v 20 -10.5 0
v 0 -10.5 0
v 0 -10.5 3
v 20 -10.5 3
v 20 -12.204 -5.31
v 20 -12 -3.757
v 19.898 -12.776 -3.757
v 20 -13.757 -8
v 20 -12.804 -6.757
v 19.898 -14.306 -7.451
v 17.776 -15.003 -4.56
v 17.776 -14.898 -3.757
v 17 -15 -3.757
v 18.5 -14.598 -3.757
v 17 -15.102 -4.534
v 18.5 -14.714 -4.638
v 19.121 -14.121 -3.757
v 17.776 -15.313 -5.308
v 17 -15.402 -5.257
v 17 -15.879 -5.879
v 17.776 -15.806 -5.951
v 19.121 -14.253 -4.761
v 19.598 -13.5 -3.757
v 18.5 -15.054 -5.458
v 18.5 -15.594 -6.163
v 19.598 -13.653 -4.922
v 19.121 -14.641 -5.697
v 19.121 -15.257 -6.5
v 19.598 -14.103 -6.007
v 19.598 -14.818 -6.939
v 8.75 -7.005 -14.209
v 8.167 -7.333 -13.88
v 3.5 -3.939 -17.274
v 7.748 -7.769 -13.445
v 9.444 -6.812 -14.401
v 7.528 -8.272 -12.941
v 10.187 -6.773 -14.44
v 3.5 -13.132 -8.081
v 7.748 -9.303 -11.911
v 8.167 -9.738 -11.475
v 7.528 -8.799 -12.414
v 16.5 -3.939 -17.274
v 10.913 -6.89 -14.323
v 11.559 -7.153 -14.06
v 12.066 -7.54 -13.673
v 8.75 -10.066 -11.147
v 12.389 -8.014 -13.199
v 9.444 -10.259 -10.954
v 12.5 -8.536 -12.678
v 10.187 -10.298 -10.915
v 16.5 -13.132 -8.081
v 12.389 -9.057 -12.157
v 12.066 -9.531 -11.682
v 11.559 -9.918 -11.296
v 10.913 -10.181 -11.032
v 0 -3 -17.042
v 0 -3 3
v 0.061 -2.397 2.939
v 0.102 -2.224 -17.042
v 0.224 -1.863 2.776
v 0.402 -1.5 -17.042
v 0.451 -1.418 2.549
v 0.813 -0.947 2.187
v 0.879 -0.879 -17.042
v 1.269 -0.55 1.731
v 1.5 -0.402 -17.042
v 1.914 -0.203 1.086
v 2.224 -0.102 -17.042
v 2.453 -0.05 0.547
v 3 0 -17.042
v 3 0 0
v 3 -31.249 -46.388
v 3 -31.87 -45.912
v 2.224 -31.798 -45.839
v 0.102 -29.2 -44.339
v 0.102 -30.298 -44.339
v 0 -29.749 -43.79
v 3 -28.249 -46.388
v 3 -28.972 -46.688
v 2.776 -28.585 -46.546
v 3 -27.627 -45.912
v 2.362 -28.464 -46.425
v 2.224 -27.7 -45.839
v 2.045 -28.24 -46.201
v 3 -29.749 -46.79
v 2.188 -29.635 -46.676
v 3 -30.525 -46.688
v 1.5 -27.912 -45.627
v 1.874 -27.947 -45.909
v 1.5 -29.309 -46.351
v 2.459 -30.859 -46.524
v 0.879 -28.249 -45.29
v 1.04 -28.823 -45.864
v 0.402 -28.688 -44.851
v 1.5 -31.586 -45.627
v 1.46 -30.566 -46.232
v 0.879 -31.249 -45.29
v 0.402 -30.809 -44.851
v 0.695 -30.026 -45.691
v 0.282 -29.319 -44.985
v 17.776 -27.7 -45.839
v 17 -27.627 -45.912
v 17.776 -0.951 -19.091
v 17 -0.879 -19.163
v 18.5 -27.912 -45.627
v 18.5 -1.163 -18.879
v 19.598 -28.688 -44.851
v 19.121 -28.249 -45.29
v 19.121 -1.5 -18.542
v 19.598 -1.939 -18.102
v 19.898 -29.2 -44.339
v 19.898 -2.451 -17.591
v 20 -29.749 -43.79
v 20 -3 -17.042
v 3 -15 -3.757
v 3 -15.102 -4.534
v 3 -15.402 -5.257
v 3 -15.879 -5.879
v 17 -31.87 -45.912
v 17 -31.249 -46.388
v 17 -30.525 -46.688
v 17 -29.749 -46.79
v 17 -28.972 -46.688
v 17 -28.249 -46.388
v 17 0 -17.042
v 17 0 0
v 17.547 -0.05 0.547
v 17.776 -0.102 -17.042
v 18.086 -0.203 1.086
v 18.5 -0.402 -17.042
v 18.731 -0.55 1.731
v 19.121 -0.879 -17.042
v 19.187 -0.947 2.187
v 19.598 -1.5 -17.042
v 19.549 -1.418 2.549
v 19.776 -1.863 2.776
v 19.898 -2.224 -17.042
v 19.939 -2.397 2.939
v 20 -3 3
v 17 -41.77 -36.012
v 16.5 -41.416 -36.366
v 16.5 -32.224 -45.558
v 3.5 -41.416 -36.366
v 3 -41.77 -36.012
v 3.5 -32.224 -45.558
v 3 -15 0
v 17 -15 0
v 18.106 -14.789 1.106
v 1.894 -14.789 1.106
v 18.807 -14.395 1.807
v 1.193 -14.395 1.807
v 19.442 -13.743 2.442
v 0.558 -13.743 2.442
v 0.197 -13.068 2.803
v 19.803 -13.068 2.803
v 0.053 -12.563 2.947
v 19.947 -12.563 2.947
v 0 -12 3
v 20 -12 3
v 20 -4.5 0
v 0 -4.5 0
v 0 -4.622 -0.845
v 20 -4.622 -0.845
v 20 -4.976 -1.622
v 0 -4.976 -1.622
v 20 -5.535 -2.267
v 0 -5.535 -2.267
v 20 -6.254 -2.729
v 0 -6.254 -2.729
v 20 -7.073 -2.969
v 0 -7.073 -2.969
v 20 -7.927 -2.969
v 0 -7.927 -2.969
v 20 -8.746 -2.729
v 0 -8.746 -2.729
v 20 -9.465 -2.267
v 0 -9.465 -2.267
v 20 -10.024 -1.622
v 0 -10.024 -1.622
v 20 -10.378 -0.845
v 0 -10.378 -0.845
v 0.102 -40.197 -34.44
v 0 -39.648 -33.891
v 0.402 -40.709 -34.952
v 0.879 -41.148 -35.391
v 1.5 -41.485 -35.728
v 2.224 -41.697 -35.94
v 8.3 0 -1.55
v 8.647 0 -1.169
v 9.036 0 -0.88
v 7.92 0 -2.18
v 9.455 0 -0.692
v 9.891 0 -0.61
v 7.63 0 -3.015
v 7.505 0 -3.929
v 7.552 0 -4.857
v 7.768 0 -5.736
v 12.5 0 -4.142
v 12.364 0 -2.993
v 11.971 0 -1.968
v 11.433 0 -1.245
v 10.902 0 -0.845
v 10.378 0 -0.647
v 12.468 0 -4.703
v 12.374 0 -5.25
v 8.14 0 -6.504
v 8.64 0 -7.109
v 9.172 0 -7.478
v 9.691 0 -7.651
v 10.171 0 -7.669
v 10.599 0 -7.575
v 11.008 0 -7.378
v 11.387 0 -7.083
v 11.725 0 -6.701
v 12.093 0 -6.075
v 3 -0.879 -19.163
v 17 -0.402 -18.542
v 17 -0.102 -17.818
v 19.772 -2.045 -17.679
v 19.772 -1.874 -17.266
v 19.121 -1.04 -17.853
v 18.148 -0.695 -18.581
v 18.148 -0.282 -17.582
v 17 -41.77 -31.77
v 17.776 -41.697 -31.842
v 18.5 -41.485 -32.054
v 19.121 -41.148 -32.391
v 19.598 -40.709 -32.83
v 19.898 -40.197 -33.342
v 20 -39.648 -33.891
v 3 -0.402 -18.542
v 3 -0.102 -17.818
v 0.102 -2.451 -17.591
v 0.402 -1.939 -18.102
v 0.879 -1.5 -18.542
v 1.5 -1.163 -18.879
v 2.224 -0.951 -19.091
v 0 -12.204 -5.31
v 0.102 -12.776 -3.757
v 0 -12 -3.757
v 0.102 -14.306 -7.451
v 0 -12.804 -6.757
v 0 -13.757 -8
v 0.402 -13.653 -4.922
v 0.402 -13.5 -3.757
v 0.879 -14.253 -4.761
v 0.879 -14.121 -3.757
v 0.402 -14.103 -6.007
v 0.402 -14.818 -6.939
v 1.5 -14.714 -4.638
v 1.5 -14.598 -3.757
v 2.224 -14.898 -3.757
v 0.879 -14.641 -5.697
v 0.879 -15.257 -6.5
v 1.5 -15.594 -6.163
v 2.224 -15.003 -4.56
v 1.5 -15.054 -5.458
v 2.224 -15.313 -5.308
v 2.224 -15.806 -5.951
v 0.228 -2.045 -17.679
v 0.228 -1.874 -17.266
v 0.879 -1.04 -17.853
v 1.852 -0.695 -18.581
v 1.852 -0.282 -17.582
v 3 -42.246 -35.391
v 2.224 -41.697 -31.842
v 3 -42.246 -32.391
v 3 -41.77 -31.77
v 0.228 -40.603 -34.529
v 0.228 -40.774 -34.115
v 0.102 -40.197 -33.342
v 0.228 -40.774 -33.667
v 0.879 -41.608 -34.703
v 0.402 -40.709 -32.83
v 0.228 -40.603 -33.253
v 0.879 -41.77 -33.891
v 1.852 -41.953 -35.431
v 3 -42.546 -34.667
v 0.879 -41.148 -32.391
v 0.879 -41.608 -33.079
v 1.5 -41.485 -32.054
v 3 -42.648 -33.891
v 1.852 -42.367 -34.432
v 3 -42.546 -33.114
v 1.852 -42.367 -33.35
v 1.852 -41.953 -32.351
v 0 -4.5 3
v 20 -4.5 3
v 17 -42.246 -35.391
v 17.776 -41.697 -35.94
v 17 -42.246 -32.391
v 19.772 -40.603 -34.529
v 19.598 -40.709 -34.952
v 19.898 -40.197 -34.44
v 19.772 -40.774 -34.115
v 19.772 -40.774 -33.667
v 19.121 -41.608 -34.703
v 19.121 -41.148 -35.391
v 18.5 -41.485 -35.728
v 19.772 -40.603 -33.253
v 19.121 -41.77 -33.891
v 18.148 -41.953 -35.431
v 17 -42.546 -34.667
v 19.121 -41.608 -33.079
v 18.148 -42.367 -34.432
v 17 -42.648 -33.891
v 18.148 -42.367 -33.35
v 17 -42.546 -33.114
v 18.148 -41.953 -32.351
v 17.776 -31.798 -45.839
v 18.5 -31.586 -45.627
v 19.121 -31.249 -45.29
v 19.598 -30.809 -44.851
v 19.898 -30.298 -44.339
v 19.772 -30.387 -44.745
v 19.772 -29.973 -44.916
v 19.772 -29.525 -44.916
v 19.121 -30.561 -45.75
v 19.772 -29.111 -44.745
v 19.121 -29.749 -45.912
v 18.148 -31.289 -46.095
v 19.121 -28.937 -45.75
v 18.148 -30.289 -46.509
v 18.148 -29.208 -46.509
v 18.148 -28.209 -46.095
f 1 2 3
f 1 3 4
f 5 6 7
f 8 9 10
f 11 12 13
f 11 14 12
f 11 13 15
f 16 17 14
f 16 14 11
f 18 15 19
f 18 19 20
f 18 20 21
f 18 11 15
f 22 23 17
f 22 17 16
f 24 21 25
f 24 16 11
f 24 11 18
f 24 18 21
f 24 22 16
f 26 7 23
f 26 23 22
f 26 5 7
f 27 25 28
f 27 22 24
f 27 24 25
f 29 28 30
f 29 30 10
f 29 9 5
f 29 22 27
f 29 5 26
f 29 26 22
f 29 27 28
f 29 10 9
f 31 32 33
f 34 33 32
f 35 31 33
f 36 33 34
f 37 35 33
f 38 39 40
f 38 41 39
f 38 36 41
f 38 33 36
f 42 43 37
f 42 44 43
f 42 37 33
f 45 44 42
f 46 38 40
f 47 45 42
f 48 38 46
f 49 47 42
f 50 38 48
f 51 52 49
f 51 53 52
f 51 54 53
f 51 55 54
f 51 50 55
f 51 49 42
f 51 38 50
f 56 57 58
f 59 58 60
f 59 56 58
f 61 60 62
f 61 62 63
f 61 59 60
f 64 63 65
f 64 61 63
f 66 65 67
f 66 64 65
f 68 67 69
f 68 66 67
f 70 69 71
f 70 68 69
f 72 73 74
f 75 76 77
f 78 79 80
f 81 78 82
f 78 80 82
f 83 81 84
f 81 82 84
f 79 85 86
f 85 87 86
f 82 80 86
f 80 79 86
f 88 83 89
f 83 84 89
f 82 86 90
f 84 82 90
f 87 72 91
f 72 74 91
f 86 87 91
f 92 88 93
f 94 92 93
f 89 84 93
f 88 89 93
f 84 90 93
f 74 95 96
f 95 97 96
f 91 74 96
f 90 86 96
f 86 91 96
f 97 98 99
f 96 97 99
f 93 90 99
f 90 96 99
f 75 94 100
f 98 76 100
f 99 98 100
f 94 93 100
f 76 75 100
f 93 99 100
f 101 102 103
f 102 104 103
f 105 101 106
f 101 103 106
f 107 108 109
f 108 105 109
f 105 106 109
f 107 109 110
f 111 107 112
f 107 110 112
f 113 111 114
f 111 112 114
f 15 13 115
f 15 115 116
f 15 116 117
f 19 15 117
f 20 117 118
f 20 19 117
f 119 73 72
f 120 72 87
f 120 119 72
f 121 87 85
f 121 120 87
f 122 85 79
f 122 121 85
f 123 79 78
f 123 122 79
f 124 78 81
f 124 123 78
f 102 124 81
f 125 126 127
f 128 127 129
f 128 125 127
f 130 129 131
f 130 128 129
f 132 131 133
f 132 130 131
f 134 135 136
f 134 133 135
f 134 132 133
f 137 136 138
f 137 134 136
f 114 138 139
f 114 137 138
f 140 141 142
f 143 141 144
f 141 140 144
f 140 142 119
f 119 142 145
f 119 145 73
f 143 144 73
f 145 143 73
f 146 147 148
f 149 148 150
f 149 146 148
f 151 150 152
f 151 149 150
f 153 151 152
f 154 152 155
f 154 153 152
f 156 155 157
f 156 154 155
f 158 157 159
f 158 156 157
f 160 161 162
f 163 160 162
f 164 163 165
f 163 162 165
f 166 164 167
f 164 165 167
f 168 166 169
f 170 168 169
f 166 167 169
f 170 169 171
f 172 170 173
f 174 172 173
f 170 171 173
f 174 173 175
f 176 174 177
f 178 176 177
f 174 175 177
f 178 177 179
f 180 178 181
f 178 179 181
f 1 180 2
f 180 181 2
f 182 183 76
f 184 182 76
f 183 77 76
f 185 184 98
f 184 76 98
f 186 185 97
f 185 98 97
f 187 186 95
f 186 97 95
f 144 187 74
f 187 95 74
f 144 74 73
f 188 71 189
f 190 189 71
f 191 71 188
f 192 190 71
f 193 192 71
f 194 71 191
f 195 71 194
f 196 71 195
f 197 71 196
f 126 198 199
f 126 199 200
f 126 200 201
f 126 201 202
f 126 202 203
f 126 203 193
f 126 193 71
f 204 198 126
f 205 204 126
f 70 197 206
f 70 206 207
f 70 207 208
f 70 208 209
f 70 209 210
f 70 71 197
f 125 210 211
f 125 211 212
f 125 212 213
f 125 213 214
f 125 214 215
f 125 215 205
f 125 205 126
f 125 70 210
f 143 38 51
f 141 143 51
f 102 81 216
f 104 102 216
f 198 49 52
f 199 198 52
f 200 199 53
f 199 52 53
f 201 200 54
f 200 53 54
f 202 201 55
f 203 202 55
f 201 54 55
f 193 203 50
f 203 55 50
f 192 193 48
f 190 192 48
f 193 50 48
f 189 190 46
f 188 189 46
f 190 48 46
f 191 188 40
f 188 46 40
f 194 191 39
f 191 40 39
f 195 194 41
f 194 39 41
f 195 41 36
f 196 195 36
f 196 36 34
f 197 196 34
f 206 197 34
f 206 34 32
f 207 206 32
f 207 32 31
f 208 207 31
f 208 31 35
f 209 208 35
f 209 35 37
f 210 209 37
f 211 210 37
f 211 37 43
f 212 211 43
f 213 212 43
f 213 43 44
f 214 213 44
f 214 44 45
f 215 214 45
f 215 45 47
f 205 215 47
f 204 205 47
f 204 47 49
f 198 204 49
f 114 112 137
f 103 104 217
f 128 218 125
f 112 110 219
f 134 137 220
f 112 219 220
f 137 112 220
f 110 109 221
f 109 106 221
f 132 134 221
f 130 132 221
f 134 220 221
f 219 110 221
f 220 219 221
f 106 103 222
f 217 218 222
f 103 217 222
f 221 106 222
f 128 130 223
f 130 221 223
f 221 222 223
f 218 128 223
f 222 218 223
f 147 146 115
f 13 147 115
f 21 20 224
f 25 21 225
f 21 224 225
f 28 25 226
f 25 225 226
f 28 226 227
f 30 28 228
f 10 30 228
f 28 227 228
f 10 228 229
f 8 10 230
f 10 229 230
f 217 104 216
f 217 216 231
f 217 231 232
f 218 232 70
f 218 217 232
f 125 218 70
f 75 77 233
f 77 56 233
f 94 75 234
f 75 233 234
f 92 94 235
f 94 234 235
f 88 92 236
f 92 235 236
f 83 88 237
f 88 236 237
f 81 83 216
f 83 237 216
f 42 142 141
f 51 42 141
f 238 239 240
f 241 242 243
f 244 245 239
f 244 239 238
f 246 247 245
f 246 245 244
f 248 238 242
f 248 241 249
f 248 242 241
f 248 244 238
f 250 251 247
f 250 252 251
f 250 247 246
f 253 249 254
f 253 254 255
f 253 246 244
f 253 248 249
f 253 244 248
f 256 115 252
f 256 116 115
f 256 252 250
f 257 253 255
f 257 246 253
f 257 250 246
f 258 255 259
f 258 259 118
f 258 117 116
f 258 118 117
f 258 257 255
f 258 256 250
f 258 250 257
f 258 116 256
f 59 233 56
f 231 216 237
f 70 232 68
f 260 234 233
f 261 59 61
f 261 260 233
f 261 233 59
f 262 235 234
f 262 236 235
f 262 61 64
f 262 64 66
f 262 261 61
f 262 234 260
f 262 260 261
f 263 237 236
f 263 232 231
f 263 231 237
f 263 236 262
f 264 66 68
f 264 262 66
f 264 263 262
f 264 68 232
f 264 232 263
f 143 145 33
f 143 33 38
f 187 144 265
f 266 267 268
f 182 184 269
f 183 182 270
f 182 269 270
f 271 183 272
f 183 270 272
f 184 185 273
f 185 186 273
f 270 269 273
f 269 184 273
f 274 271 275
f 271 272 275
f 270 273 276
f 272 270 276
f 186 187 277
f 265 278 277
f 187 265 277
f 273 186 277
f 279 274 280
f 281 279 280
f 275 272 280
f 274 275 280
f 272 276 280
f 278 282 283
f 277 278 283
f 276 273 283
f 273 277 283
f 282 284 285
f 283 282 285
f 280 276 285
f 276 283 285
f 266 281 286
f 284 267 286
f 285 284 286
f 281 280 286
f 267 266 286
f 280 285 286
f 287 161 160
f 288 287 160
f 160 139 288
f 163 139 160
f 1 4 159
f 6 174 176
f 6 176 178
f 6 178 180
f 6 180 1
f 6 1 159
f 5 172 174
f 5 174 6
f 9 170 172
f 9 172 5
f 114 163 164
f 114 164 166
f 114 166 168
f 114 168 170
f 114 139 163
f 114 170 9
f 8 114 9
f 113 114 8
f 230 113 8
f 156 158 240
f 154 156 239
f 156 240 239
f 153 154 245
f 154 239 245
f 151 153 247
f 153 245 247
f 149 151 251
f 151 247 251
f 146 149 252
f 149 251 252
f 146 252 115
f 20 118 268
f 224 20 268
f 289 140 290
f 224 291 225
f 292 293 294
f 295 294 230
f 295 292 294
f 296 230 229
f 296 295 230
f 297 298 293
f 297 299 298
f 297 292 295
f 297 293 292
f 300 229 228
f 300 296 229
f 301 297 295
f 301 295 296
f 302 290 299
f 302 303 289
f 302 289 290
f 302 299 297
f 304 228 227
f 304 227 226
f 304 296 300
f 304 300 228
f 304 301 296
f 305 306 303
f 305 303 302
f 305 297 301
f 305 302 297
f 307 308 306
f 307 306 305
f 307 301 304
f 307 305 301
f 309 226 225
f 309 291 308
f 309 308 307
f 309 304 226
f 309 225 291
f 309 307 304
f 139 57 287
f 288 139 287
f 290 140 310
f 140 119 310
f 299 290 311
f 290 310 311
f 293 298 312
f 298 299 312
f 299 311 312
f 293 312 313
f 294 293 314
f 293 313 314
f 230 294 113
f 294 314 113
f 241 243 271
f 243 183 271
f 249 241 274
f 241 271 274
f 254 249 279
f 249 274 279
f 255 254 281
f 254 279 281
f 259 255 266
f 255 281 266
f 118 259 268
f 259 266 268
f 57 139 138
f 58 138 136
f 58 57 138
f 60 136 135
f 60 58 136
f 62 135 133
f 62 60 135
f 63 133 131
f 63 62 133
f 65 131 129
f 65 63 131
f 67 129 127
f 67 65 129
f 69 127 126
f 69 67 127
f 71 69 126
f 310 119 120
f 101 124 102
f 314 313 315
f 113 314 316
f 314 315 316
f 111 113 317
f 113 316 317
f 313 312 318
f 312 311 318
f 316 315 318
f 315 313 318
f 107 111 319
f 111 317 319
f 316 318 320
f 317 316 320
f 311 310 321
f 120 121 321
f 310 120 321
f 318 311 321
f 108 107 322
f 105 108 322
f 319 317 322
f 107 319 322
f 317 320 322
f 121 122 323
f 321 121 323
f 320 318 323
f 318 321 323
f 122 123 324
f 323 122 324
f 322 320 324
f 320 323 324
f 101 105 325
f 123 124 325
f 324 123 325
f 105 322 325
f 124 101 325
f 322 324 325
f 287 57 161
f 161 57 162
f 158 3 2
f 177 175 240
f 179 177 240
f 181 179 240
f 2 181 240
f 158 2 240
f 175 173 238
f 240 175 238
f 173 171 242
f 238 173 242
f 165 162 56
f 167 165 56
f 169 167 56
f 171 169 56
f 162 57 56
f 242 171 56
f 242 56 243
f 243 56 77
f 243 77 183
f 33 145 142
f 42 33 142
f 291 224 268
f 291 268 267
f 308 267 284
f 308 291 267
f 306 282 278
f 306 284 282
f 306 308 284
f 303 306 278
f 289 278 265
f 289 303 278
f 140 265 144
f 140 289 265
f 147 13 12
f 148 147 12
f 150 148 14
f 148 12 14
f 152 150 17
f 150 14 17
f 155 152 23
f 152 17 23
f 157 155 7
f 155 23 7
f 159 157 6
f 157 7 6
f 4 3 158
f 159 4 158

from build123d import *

# Parameters (mm, degrees)
F1_DEPTH    = 20
F2_W        = 13
F2_H        = 13
F3_DEPTH    = 40
F4_R        = 2.5
F5_REACH    = 22.0720678119
F6_F1_R     = 3
F6_F2_R     = 3
F7_DEPTH    = 3
F8_T1_DEPTH = 29


# Not quite as in the source:
# - a fillet or chamfer that OpenCascade refuses, or shapes differently, is made with other operations: its cross-section is extruded or revolved along the edge and cut away or added


with BuildPart() as f1:
    # F0 (on Right) → F1 (new body)
    with BuildSketch(Plane.YZ):
        with BuildLine():
            Line((0, -18.2842712475), (0, 0))
            Line((0, 0), (-4.5, 0))
            ThreePointArc((-4.5, 0), (-7.5, -3), (-10.5, 0))
            Line((-10.5, 0), (-15, 0))
            Line((-15, 0), (-15, -5))
            Line((-15, -5), (-43.8908729653, -33.8908729653))
            Line((-43.8908729653, -33.8908729653), (-29.7487373415, -48.033008589))
            Line((-29.7487373415, -48.033008589), (0, -18.2842712475))
        make_face()
    extrude(amount=F1_DEPTH)

    # F2 (on face) → F3 (cut)
    with BuildSketch(Plane(origin=(0, -38.8908729653, -38.8908729653), x_dir=(1, 0, 0), z_dir=(0, -0.7071067812, -0.7071067812))):
        with Locations((10, -2.9289321881)):
            Rectangle(F2_W, F2_H)
    extrude(amount=-F3_DEPTH, mode=Mode.SUBTRACT)

    f5_end = f1.faces().sort_by_distance((10, 0, -9.1421356237))[0]
    # F4 (on face) → F5 (cut, up to a face of the model that its end follows)
    with BuildSketch(Plane(origin=(0, -10.6066017178, -10.6066017178), x_dir=(1, 0, 0), z_dir=(0, -0.7071067812, -0.7071067812))):
        with Locations((10, -2.9289321881)):
            Circle(F4_R)
    f5_long = extrude(amount=-F5_REACH, mode=Mode.PRIVATE)
    add(split(f5_long, bisect_by=f5_end, keep=Keep.BOTTOM, mode=Mode.PRIVATE), mode=Mode.SUBTRACT)

    # F6: fillet of radius 3 on 12 edges, made by hand

    # F6_f1
    f6_f1_edges = [f1.edges().sort_by_distance(p)[0] for p in [
        (10, -15, -5),
    ]]
    fillet(f6_f1_edges, radius=F6_F1_R)

    # F6_f2
    f6_f2_edges = [f1.edges().sort_by_distance(p)[0] for p in [
        (10, -43.8908729653, -33.8908729653),
        (0, -36.8198051534, -40.9619407771),
        (10, -29.7487373415, -48.033008589),
        (20, -36.8198051534, -40.9619407771),
        (10, 0, -18.2842712475),
        (20, -14.8743686708, -33.1586399182),
        (20, 0, -9.1421356237),
        (20, -15, -1.8786796564),
        (0, -15, -1.8786796564),
        (0, -14.8743686708, -33.1586399182),
        (0, 0, -9.1421356237),
        (0, -15.2283614025, -4.90540961),
        (20, -15.2283614025, -4.90540961),
    ]]
    fillet(f6_f2_edges, radius=F6_F2_R)

    # F7 (add): faces of the model
    f7_faces = [f1.faces().sort_by_distance(p)[0] for p in [
        (10, -2.3208506609, 0),
        (10, -12.6791493391, 0),
    ]]
    extrude(f7_faces, amount=F7_DEPTH)

    # F8: fillet of radius 3 on 2 edges, made by hand

    # F8_s2 → F8_t1 (cut)
    with BuildSketch(Plane.YZ.offset(-4.5)):
        with BuildLine():
            ThreePointArc((-15, 0), (-14.1213203436, 2.1213203436), (-12, 3))
            Line((-12, 3), (-15, 3))
            Line((-15, 3), (-15, 0))
        make_face()
        with BuildLine():
            ThreePointArc((-3, 3), (-0.8786796564, 2.1213203436), (0, 0))
            Line((0, 0), (0, 3))
            Line((0, 3), (-3, 3))
        make_face()
    extrude(amount=F8_T1_DEPTH, mode=Mode.SUBTRACT)


solid = f1.part
